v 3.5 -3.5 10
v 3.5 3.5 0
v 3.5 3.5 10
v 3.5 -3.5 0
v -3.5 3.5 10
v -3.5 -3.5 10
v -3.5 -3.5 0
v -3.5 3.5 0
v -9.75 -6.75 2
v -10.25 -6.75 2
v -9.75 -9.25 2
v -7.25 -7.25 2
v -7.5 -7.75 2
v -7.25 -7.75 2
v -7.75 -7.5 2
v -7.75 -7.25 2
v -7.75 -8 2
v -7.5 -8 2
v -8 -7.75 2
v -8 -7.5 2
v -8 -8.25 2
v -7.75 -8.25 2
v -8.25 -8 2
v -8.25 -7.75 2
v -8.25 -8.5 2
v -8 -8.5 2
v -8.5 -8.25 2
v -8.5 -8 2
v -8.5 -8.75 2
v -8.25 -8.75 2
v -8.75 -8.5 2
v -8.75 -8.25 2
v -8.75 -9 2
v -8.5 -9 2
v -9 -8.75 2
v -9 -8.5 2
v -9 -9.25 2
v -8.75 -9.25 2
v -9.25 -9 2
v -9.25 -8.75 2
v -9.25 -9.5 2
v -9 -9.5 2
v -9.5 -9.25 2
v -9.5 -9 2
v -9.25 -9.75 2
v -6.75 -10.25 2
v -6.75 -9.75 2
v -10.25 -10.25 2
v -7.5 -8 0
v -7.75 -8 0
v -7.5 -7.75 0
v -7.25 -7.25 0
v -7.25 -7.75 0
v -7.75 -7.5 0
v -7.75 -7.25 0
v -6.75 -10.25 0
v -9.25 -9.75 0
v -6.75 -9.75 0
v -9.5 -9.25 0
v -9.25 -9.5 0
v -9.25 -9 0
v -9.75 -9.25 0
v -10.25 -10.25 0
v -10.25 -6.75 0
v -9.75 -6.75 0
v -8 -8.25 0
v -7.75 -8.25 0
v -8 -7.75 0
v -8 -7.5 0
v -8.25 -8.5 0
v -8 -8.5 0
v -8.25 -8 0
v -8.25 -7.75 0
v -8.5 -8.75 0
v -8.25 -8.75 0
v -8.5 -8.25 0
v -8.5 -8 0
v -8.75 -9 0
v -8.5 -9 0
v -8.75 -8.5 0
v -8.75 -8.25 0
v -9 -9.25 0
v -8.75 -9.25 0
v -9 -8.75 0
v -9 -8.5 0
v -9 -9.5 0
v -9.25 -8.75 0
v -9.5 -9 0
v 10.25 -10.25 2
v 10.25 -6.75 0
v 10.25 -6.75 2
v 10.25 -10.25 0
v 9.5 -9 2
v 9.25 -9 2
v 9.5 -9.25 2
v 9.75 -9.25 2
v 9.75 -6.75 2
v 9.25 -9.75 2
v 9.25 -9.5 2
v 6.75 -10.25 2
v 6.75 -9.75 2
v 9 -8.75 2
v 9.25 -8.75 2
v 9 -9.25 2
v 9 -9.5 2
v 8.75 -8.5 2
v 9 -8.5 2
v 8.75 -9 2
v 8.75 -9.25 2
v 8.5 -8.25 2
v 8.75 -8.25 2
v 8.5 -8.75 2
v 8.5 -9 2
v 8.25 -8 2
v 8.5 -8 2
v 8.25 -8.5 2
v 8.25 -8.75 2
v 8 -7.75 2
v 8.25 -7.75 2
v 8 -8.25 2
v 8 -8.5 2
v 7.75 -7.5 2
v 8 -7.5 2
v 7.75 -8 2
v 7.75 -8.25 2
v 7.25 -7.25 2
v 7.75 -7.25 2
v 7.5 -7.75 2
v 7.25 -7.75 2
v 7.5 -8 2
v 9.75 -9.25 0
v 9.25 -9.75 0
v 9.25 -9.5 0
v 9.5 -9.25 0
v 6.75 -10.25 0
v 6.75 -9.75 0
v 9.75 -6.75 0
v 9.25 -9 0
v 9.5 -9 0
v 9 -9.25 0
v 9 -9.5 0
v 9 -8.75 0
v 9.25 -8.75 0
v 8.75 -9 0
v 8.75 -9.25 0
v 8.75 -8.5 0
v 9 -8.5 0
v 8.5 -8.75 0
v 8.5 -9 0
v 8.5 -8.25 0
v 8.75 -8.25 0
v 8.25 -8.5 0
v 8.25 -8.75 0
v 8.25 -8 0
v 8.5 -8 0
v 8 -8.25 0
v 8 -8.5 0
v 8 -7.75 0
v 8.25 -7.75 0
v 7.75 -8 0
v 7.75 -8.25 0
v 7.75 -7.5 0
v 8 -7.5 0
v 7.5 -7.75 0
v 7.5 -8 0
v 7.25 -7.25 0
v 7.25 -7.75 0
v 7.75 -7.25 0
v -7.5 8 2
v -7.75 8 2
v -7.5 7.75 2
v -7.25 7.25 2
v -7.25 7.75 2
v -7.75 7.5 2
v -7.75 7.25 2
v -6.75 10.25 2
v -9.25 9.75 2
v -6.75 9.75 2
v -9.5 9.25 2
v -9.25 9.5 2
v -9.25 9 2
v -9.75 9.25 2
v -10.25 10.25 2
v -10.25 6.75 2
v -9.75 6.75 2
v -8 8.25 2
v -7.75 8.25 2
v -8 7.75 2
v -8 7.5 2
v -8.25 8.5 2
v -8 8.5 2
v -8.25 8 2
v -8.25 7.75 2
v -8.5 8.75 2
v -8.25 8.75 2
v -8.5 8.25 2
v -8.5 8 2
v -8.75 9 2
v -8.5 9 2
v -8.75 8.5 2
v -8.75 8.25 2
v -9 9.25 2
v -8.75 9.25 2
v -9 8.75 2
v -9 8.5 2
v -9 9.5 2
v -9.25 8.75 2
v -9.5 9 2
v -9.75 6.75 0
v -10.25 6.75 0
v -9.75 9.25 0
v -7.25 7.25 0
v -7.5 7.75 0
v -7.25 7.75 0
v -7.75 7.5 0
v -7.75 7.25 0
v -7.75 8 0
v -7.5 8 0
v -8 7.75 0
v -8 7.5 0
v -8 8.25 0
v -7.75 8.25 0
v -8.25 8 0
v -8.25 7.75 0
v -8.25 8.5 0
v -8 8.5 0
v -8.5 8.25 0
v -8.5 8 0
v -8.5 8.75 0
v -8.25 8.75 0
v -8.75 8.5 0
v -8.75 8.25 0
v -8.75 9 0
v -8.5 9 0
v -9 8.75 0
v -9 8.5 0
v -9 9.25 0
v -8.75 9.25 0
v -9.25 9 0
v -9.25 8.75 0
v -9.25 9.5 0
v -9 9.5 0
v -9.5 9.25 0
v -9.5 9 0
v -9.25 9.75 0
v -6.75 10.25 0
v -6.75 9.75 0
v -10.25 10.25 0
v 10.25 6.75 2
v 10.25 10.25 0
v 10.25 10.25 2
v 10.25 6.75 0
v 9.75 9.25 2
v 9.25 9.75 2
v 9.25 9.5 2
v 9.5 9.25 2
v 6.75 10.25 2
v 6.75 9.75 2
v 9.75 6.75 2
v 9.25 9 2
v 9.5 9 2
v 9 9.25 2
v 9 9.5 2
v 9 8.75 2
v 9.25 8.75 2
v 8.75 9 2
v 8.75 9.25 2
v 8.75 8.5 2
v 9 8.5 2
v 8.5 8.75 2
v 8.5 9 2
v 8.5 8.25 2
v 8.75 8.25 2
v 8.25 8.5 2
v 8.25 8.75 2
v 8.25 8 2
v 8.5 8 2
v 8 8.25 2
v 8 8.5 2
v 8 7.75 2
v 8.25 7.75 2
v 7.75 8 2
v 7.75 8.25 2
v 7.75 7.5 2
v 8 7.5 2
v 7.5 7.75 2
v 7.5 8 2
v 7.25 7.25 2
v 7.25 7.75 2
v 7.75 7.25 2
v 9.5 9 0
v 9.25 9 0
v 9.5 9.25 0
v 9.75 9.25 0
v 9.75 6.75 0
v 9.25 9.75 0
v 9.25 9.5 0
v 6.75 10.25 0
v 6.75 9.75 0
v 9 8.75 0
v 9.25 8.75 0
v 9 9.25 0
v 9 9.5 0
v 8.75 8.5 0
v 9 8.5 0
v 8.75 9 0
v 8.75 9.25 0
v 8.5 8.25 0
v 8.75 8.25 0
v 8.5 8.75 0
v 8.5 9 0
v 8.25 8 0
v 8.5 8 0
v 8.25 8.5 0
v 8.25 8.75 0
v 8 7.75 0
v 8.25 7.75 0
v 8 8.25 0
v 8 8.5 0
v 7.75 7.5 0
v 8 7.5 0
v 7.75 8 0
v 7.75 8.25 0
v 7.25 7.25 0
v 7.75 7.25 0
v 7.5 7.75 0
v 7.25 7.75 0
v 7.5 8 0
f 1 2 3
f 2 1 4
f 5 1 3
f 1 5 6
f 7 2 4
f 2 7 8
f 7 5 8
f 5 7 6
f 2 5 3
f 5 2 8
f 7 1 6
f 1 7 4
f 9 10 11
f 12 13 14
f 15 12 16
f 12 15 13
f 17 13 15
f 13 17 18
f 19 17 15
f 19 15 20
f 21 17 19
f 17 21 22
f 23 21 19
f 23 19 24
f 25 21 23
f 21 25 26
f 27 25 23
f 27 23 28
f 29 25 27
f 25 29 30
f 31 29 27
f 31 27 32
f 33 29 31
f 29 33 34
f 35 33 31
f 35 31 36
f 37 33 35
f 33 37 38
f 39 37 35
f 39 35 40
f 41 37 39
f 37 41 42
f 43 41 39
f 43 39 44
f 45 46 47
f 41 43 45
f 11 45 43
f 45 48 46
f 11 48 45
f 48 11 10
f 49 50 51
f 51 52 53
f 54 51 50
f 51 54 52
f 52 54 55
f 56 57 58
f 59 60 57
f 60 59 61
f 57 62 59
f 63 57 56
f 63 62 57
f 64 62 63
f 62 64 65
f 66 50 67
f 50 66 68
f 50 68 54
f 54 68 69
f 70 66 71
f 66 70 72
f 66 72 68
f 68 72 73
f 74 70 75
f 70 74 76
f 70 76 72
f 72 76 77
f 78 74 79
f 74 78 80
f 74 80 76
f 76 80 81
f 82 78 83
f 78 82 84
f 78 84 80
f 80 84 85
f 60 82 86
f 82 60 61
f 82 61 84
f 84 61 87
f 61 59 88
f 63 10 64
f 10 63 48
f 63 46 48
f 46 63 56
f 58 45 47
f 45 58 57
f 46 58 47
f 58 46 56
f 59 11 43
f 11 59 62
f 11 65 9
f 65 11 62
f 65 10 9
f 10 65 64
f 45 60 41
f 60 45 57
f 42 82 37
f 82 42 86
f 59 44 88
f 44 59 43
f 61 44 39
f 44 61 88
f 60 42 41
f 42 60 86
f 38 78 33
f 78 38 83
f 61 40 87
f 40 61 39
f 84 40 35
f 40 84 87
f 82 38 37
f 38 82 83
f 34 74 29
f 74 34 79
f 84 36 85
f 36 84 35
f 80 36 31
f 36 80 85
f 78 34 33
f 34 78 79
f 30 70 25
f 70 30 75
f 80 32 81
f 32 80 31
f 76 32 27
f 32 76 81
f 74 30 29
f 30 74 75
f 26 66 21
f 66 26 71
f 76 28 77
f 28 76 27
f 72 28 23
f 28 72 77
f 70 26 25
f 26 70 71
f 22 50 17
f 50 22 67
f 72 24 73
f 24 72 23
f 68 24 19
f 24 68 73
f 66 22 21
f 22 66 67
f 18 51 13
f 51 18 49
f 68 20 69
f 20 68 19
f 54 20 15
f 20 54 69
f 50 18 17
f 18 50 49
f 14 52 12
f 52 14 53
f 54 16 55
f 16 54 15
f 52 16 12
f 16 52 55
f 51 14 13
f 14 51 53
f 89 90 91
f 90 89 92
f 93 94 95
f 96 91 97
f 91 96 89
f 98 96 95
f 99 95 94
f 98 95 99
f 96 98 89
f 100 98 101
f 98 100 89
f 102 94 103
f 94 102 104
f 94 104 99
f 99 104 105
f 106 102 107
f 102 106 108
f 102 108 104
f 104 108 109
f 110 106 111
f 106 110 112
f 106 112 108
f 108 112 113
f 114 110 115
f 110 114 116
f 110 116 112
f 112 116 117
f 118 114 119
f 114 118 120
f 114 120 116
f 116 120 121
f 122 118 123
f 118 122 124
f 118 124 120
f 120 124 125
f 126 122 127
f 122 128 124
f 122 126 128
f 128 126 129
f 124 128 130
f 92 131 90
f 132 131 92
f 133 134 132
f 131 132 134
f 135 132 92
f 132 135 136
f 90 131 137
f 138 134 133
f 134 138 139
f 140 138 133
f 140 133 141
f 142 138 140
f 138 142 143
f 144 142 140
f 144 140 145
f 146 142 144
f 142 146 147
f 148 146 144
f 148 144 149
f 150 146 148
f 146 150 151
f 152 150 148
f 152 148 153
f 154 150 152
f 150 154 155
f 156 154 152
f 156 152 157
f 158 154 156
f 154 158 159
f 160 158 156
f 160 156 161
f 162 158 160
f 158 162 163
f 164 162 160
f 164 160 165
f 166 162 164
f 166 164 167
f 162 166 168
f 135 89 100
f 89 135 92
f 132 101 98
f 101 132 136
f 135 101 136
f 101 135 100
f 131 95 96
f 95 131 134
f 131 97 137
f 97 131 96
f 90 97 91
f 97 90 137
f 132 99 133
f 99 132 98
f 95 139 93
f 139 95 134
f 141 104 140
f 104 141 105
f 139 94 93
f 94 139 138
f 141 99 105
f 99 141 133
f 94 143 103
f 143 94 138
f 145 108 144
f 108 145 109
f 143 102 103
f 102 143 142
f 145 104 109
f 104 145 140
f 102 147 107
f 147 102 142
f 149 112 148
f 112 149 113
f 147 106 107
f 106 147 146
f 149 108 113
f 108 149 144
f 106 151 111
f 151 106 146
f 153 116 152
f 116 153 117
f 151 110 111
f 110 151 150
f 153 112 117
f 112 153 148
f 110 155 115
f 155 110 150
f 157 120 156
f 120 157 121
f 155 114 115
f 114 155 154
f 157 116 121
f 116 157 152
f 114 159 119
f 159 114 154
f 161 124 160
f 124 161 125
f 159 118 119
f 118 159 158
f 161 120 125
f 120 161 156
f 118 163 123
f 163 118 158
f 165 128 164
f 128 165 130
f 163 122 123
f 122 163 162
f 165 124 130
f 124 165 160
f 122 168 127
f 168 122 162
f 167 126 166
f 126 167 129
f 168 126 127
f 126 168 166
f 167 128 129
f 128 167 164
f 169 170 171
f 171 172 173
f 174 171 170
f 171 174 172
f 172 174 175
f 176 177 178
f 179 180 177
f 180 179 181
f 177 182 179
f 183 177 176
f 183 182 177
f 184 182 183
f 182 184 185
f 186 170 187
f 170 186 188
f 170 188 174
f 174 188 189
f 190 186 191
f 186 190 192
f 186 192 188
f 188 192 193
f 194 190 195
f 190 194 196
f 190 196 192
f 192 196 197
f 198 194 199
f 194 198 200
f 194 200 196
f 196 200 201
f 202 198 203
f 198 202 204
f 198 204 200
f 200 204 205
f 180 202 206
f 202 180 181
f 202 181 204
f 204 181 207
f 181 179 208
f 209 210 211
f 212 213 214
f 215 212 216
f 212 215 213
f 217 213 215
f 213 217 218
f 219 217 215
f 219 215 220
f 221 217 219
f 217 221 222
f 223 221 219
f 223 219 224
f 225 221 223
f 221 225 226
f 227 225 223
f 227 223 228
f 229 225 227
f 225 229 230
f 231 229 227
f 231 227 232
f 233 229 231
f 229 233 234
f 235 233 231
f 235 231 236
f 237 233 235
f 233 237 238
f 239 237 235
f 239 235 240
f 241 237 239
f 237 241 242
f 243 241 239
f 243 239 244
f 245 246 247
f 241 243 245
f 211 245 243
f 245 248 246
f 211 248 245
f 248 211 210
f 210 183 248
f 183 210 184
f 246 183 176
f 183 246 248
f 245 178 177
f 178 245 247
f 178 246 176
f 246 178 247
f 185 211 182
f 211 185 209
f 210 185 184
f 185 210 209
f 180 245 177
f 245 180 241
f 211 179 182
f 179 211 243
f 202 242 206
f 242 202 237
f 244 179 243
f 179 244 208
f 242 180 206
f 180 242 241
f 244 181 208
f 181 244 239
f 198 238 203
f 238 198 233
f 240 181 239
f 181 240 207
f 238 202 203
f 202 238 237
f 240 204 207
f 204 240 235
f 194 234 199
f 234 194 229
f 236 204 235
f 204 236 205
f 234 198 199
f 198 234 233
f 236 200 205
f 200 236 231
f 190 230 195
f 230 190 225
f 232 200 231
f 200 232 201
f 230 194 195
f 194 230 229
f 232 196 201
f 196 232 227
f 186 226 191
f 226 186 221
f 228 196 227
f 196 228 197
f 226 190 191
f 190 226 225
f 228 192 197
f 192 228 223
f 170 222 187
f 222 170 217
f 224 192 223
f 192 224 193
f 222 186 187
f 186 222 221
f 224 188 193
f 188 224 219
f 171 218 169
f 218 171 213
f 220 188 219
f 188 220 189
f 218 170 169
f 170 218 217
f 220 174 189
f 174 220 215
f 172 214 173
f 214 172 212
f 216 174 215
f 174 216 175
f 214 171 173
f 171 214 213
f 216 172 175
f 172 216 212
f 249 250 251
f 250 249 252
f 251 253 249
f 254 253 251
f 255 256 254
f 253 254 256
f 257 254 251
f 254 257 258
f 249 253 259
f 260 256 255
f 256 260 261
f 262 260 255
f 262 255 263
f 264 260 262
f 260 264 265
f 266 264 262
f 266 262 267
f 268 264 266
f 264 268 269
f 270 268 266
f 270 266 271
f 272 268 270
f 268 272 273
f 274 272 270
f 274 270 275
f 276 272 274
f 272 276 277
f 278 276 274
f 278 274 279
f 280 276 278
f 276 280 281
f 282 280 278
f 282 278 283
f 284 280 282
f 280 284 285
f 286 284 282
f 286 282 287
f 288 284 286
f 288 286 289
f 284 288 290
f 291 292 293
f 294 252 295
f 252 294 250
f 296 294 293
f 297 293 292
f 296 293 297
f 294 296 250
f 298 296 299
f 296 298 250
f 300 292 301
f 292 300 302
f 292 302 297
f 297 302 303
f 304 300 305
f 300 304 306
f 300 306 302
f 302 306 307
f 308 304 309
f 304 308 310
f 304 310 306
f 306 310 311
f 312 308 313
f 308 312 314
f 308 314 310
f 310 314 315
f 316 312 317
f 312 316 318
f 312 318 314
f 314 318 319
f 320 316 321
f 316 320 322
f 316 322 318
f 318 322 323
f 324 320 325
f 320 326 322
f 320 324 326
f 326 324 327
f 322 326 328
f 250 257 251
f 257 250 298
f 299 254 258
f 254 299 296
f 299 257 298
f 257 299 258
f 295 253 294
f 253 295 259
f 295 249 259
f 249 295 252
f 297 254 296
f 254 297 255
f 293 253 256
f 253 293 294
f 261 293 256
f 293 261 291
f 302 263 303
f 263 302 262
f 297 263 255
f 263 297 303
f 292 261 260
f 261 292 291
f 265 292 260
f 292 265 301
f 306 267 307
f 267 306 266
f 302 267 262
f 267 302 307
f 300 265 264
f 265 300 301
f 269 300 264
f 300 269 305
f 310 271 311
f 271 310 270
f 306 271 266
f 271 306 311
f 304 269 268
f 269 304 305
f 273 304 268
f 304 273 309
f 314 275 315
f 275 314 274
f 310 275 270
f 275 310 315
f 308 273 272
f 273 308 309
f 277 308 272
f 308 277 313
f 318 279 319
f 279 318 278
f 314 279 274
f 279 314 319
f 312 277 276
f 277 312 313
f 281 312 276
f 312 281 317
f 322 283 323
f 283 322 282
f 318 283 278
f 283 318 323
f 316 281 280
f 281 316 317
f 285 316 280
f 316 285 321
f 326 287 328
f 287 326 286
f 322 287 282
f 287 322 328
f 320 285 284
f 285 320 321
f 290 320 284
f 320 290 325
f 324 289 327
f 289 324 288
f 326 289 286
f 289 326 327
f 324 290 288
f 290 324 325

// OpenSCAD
translate([0, 0, 5]) color([0,1,0,0.9]) cube([7, 7, 10], center=true);
translate([-10.0, -10.0, 1]) color([1,0,0]) cube([0.5, 0.5, 2], center=true);
translate([-9.75, -10.0, 1]) color([1,0,0]) cube([0.5, 0.5, 2], center=true);
translate([-9.5, -10.0, 1]) color([1,0,0]) cube([0.5, 0.5, 2], center=true);
translate([-9.25, -10.0, 1]) color([1,0,0]) cube([0.5, 0.5, 2], center=true);
translate([-9.0, -10.0, 1]) color([1,0,0]) cube([0.5, 0.5, 2], center=true);
translate([-8.75, -10.0, 1]) color([1,0,0]) cube([0.5, 0.5, 2], center=true);
translate([-8.5, -10.0, 1]) color([1,0,0]) cube([0.5, 0.5, 2], center=true);
translate([-8.25, -10.0, 1]) color([1,0,0]) cube([0.5, 0.5, 2], center=true);
translate([-8.0, -10.0, 1]) color([1,0,0]) cube([0.5, 0.5, 2], center=true);
translate([-7.75, -10.0, 1]) color([1,0,0]) cube([0.5, 0.5, 2], center=true);
translate([-7.5, -10.0, 1]) color([1,0,0]) cube([0.5, 0.5, 2], center=true);
translate([-7.25, -10.0, 1]) color([1,0,0]) cube([0.5, 0.5, 2], center=true);
translate([-7.0, -10.0, 1]) color([1,0,0]) cube([0.5, 0.5, 2], center=true);
translate([-10.0, -9.75, 1]) color([1,0,0]) cube([0.5, 0.5, 2], center=true);
translate([-10.0, -9.5, 1]) color([1,0,0]) cube([0.5, 0.5, 2], center=true);
translate([-10.0, -9.25, 1]) color([1,0,0]) cube([0.5, 0.5, 2], center=true);
translate([-10.0, -9.0, 1]) color([1,0,0]) cube([0.5, 0.5, 2], center=true);
translate([-10.0, -8.75, 1]) color([1,0,0]) cube([0.5, 0.5, 2], center=true);
translate([-10.0, -8.5, 1]) color([1,0,0]) cube([0.5, 0.5, 2], center=true);
translate([-10.0, -8.25, 1]) color([1,0,0]) cube([0.5, 0.5, 2], center=true);
translate([-10.0, -8.0, 1]) color([1,0,0]) cube([0.5, 0.5, 2], center=true);
translate([-10.0, -7.75, 1]) color([1,0,0]) cube([0.5, 0.5, 2], center=true);
translate([-10.0, -7.5, 1]) color([1,0,0]) cube([0.5, 0.5, 2], center=true);
translate([-10.0, -7.25, 1]) color([1,0,0]) cube([0.5, 0.5, 2], center=true);
translate([-10.0, -7.0, 1]) color([1,0,0]) cube([0.5, 0.5, 2], center=true);
translate([-9.75, -9.75, 1]) color([1,0,0]) cube([0.5, 0.5, 2], center=true);
translate([-9.5, -9.5, 1]) color([1,0,0]) cube([0.5, 0.5, 2], center=true);
translate([-9.25, -9.25, 1]) color([1,0,0]) cube([0.5, 0.5, 2], center=true);
translate([-9.0, -9.0, 1]) color([1,0,0]) cube([0.5, 0.5, 2], center=true);
translate([-8.75, -8.75, 1]) color([1,0,0]) cube([0.5, 0.5, 2], center=true);
translate([-8.5, -8.5, 1]) color([1,0,0]) cube([0.5, 0.5, 2], center=true);
translate([-8.25, -8.25, 1]) color([1,0,0]) cube([0.5, 0.5, 2], center=true);
translate([-8.0, -8.0, 1]) color([1,0,0]) cube([0.5, 0.5, 2], center=true);
translate([-7.75, -7.75, 1]) color([1,0,0]) cube([0.5, 0.5, 2], center=true);
translate([-7.5, -7.5, 1]) color([1,0,0]) cube([0.5, 0.5, 2], center=true);
translate([10.0, -10.0, 1]) color([1,0,0]) cube([0.5, 0.5, 2], center=true);
translate([9.75, -10.0, 1]) color([1,0,0]) cube([0.5, 0.5, 2], center=true);
translate([9.5, -10.0, 1]) color([1,0,0]) cube([0.5, 0.5, 2], center=true);
translate([9.25, -10.0, 1]) color([1,0,0]) cube([0.5, 0.5, 2], center=true);
translate([9.0, -10.0, 1]) color([1,0,0]) cube([0.5, 0.5, 2], center=true);
translate([8.75, -10.0, 1]) color([1,0,0]) cube([0.5, 0.5, 2], center=true);
translate([8.5, -10.0, 1]) color([1,0,0]) cube([0.5, 0.5, 2], center=true);
translate([8.25, -10.0, 1]) color([1,0,0]) cube([0.5, 0.5, 2], center=true);
translate([8.0, -10.0, 1]) color([1,0,0]) cube([0.5, 0.5, 2], center=true);
translate([7.75, -10.0, 1]) color([1,0,0]) cube([0.5, 0.5, 2], center=true);
translate([7.5, -10.0, 1]) color([1,0,0]) cube([0.5, 0.5, 2], center=true);
translate([7.25, -10.0, 1]) color([1,0,0]) cube([0.5, 0.5, 2], center=true);
translate([7.0, -10.0, 1]) color([1,0,0]) cube([0.5, 0.5, 2], center=true);
translate([10.0, -9.75, 1]) color([1,0,0]) cube([0.5, 0.5, 2], center=true);
translate([10.0, -9.5, 1]) color([1,0,0]) cube([0.5, 0.5, 2], center=true);
translate([10.0, -9.25, 1]) color([1,0,0]) cube([0.5, 0.5, 2], center=true);
translate([10.0, -9.0, 1]) color([1,0,0]) cube([0.5, 0.5, 2], center=true);
translate([10.0, -8.75, 1]) color([1,0,0]) cube([0.5, 0.5, 2], center=true);
translate([10.0, -8.5, 1]) color([1,0,0]) cube([0.5, 0.5, 2], center=true);
translate([10.0, -8.25, 1]) color([1,0,0]) cube([0.5, 0.5, 2], center=true);
translate([10.0, -8.0, 1]) color([1,0,0]) cube([0.5, 0.5, 2], center=true);
translate([10.0, -7.75, 1]) color([1,0,0]) cube([0.5, 0.5, 2], center=true);
translate([10.0, -7.5, 1]) color([1,0,0]) cube([0.5, 0.5, 2], center=true);
translate([10.0, -7.25, 1]) color([1,0,0]) cube([0.5, 0.5, 2], center=true);
translate([10.0, -7.0, 1]) color([1,0,0]) cube([0.5, 0.5, 2], center=true);
translate([9.75, -9.75, 1]) color([1,0,0]) cube([0.5, 0.5, 2], center=true);
translate([9.5, -9.5, 1]) color([1,0,0]) cube([0.5, 0.5, 2], center=true);
translate([9.25, -9.25, 1]) color([1,0,0]) cube([0.5, 0.5, 2], center=true);
translate([9.0, -9.0, 1]) color([1,0,0]) cube([0.5, 0.5, 2], center=true);
translate([8.75, -8.75, 1]) color([1,0,0]) cube([0.5, 0.5, 2], center=true);
translate([8.5, -8.5, 1]) color([1,0,0]) cube([0.5, 0.5, 2], center=true);
translate([8.25, -8.25, 1]) color([1,0,0]) cube([0.5, 0.5, 2], center=true);
translate([8.0, -8.0, 1]) color([1,0,0]) cube([0.5, 0.5, 2], center=true);
translate([7.75, -7.75, 1]) color([1,0,0]) cube([0.5, 0.5, 2], center=true);
translate([7.5, -7.5, 1]) color([1,0,0]) cube([0.5, 0.5, 2], center=true);
translate([-10.0, 10.0, 1]) color([1,0,0]) cube([0.5, 0.5, 2], center=true);
translate([-9.75, 10.0, 1]) color([1,0,0]) cube([0.5, 0.5, 2], center=true);
translate([-9.5, 10.0, 1]) color([1,0,0]) cube([0.5, 0.5, 2], center=true);
translate([-9.25, 10.0, 1]) color([1,0,0]) cube([0.5, 0.5, 2], center=true);
translate([-9.0, 10.0, 1]) color([1,0,0]) cube([0.5, 0.5, 2], center=true);
translate([-8.75, 10.0, 1]) color([1,0,0]) cube([0.5, 0.5, 2], center=true);
translate([-8.5, 10.0, 1]) color([1,0,0]) cube([0.5, 0.5, 2], center=true);
translate([-8.25, 10.0, 1]) color([1,0,0]) cube([0.5, 0.5, 2], center=true);
translate([-8.0, 10.0, 1]) color([1,0,0]) cube([0.5, 0.5, 2], center=true);
translate([-7.75, 10.0, 1]) color([1,0,0]) cube([0.5, 0.5, 2], center=true);
translate([-7.5, 10.0, 1]) color([1,0,0]) cube([0.5, 0.5, 2], center=true);
translate([-7.25, 10.0, 1]) color([1,0,0]) cube([0.5, 0.5, 2], center=true);
translate([-7.0, 10.0, 1]) color([1,0,0]) cube([0.5, 0.5, 2], center=true);
translate([-10.0, 9.75, 1]) color([1,0,0]) cube([0.5, 0.5, 2], center=true);
translate([-10.0, 9.5, 1]) color([1,0,0]) cube([0.5, 0.5, 2], center=true);
translate([-10.0, 9.25, 1]) color([1,0,0]) cube([0.5, 0.5, 2], center=true);
translate([-10.0, 9.0, 1]) color([1,0,0]) cube([0.5, 0.5, 2], center=true);
translate([-10.0, 8.75, 1]) color([1,0,0]) cube([0.5, 0.5, 2], center=true);
translate([-10.0, 8.5, 1]) color([1,0,0]) cube([0.5, 0.5, 2], center=true);
translate([-10.0, 8.25, 1]) color([1,0,0]) cube([0.5, 0.5, 2], center=true);
translate([-10.0, 8.0, 1]) color([1,0,0]) cube([0.5, 0.5, 2], center=true);
translate([-10.0, 7.75, 1]) color([1,0,0]) cube([0.5, 0.5, 2], center=true);
translate([-10.0, 7.5, 1]) color([1,0,0]) cube([0.5, 0.5, 2], center=true);
translate([-10.0, 7.25, 1]) color([1,0,0]) cube([0.5, 0.5, 2], center=true);
translate([-10.0, 7.0, 1]) color([1,0,0]) cube([0.5, 0.5, 2], center=true);
translate([-9.75, 9.75, 1]) color([1,0,0]) cube([0.5, 0.5, 2], center=true);
translate([-9.5, 9.5, 1]) color([1,0,0]) cube([0.5, 0.5, 2], center=true);
translate([-9.25, 9.25, 1]) color([1,0,0]) cube([0.5, 0.5, 2], center=true);
translate([-9.0, 9.0, 1]) color([1,0,0]) cube([0.5, 0.5, 2], center=true);
translate([-8.75, 8.75, 1]) color([1,0,0]) cube([0.5, 0.5, 2], center=true);
translate([-8.5, 8.5, 1]) color([1,0,0]) cube([0.5, 0.5, 2], center=true);
translate([-8.25, 8.25, 1]) color([1,0,0]) cube([0.5, 0.5, 2], center=true);
translate([-8.0, 8.0, 1]) color([1,0,0]) cube([0.5, 0.5, 2], center=true);
translate([-7.75, 7.75, 1]) color([1,0,0]) cube([0.5, 0.5, 2], center=true);
translate([-7.5, 7.5, 1]) color([1,0,0]) cube([0.5, 0.5, 2], center=true);
translate([10.0, 10.0, 1]) color([1,0,0]) cube([0.5, 0.5, 2], center=true);
translate([9.75, 10.0, 1]) color([1,0,0]) cube([0.5, 0.5, 2], center=true);
translate([9.5, 10.0, 1]) color([1,0,0]) cube([0.5, 0.5, 2], center=true);
translate([9.25, 10.0, 1]) color([1,0,0]) cube([0.5, 0.5, 2], center=true);
translate([9.0, 10.0, 1]) color([1,0,0]) cube([0.5, 0.5, 2], center=true);
translate([8.75, 10.0, 1]) color([1,0,0]) cube([0.5, 0.5, 2], center=true);
translate([8.5, 10.0, 1]) color([1,0,0]) cube([0.5, 0.5, 2], center=true);
translate([8.25, 10.0, 1]) color([1,0,0]) cube([0.5, 0.5, 2], center=true);
translate([8.0, 10.0, 1]) color([1,0,0]) cube([0.5, 0.5, 2], center=true);
translate([7.75, 10.0, 1]) color([1,0,0]) cube([0.5, 0.5, 2], center=true);
translate([7.5, 10.0, 1]) color([1,0,0]) cube([0.5, 0.5, 2], center=true);
translate([7.25, 10.0, 1]) color([1,0,0]) cube([0.5, 0.5, 2], center=true);
translate([7.0, 10.0, 1]) color([1,0,0]) cube([0.5, 0.5, 2], center=true);
translate([10.0, 9.75, 1]) color([1,0,0]) cube([0.5, 0.5, 2], center=true);
translate([10.0, 9.5, 1]) color([1,0,0]) cube([0.5, 0.5, 2], center=true);
translate([10.0, 9.25, 1]) color([1,0,0]) cube([0.5, 0.5, 2], center=true);
translate([10.0, 9.0, 1]) color([1,0,0]) cube([0.5, 0.5, 2], center=true);
translate([10.0, 8.75, 1]) color([1,0,0]) cube([0.5, 0.5, 2], center=true);
translate([10.0, 8.5, 1]) color([1,0,0]) cube([0.5, 0.5, 2], center=true);
translate([10.0, 8.25, 1]) color([1,0,0]) cube([0.5, 0.5, 2], center=true);
translate([10.0, 8.0, 1]) color([1,0,0]) cube([0.5, 0.5, 2], center=true);
translate([10.0, 7.75, 1]) color([1,0,0]) cube([0.5, 0.5, 2], center=true);
translate([10.0, 7.5, 1]) color([1,0,0]) cube([0.5, 0.5, 2], center=true);
translate([10.0, 7.25, 1]) color([1,0,0]) cube([0.5, 0.5, 2], center=true);
translate([10.0, 7.0, 1]) color([1,0,0]) cube([0.5, 0.5, 2], center=true);
translate([9.75, 9.75, 1]) color([1,0,0]) cube([0.5, 0.5, 2], center=true);
translate([9.5, 9.5, 1]) color([1,0,0]) cube([0.5, 0.5, 2], center=true);
translate([9.25, 9.25, 1]) color([1,0,0]) cube([0.5, 0.5, 2], center=true);
translate([9.0, 9.0, 1]) color([1,0,0]) cube([0.5, 0.5, 2], center=true);
translate([8.75, 8.75, 1]) color([1,0,0]) cube([0.5, 0.5, 2], center=true);
translate([8.5, 8.5, 1]) color([1,0,0]) cube([0.5, 0.5, 2], center=true);
translate([8.25, 8.25, 1]) color([1,0,0]) cube([0.5, 0.5, 2], center=true);
translate([8.0, 8.0, 1]) color([1,0,0]) cube([0.5, 0.5, 2], center=true);
translate([7.75, 7.75, 1]) color([1,0,0]) cube([0.5, 0.5, 2], center=true);
translate([7.5, 7.5, 1]) color([1,0,0]) cube([0.5, 0.5, 2], center=true);
